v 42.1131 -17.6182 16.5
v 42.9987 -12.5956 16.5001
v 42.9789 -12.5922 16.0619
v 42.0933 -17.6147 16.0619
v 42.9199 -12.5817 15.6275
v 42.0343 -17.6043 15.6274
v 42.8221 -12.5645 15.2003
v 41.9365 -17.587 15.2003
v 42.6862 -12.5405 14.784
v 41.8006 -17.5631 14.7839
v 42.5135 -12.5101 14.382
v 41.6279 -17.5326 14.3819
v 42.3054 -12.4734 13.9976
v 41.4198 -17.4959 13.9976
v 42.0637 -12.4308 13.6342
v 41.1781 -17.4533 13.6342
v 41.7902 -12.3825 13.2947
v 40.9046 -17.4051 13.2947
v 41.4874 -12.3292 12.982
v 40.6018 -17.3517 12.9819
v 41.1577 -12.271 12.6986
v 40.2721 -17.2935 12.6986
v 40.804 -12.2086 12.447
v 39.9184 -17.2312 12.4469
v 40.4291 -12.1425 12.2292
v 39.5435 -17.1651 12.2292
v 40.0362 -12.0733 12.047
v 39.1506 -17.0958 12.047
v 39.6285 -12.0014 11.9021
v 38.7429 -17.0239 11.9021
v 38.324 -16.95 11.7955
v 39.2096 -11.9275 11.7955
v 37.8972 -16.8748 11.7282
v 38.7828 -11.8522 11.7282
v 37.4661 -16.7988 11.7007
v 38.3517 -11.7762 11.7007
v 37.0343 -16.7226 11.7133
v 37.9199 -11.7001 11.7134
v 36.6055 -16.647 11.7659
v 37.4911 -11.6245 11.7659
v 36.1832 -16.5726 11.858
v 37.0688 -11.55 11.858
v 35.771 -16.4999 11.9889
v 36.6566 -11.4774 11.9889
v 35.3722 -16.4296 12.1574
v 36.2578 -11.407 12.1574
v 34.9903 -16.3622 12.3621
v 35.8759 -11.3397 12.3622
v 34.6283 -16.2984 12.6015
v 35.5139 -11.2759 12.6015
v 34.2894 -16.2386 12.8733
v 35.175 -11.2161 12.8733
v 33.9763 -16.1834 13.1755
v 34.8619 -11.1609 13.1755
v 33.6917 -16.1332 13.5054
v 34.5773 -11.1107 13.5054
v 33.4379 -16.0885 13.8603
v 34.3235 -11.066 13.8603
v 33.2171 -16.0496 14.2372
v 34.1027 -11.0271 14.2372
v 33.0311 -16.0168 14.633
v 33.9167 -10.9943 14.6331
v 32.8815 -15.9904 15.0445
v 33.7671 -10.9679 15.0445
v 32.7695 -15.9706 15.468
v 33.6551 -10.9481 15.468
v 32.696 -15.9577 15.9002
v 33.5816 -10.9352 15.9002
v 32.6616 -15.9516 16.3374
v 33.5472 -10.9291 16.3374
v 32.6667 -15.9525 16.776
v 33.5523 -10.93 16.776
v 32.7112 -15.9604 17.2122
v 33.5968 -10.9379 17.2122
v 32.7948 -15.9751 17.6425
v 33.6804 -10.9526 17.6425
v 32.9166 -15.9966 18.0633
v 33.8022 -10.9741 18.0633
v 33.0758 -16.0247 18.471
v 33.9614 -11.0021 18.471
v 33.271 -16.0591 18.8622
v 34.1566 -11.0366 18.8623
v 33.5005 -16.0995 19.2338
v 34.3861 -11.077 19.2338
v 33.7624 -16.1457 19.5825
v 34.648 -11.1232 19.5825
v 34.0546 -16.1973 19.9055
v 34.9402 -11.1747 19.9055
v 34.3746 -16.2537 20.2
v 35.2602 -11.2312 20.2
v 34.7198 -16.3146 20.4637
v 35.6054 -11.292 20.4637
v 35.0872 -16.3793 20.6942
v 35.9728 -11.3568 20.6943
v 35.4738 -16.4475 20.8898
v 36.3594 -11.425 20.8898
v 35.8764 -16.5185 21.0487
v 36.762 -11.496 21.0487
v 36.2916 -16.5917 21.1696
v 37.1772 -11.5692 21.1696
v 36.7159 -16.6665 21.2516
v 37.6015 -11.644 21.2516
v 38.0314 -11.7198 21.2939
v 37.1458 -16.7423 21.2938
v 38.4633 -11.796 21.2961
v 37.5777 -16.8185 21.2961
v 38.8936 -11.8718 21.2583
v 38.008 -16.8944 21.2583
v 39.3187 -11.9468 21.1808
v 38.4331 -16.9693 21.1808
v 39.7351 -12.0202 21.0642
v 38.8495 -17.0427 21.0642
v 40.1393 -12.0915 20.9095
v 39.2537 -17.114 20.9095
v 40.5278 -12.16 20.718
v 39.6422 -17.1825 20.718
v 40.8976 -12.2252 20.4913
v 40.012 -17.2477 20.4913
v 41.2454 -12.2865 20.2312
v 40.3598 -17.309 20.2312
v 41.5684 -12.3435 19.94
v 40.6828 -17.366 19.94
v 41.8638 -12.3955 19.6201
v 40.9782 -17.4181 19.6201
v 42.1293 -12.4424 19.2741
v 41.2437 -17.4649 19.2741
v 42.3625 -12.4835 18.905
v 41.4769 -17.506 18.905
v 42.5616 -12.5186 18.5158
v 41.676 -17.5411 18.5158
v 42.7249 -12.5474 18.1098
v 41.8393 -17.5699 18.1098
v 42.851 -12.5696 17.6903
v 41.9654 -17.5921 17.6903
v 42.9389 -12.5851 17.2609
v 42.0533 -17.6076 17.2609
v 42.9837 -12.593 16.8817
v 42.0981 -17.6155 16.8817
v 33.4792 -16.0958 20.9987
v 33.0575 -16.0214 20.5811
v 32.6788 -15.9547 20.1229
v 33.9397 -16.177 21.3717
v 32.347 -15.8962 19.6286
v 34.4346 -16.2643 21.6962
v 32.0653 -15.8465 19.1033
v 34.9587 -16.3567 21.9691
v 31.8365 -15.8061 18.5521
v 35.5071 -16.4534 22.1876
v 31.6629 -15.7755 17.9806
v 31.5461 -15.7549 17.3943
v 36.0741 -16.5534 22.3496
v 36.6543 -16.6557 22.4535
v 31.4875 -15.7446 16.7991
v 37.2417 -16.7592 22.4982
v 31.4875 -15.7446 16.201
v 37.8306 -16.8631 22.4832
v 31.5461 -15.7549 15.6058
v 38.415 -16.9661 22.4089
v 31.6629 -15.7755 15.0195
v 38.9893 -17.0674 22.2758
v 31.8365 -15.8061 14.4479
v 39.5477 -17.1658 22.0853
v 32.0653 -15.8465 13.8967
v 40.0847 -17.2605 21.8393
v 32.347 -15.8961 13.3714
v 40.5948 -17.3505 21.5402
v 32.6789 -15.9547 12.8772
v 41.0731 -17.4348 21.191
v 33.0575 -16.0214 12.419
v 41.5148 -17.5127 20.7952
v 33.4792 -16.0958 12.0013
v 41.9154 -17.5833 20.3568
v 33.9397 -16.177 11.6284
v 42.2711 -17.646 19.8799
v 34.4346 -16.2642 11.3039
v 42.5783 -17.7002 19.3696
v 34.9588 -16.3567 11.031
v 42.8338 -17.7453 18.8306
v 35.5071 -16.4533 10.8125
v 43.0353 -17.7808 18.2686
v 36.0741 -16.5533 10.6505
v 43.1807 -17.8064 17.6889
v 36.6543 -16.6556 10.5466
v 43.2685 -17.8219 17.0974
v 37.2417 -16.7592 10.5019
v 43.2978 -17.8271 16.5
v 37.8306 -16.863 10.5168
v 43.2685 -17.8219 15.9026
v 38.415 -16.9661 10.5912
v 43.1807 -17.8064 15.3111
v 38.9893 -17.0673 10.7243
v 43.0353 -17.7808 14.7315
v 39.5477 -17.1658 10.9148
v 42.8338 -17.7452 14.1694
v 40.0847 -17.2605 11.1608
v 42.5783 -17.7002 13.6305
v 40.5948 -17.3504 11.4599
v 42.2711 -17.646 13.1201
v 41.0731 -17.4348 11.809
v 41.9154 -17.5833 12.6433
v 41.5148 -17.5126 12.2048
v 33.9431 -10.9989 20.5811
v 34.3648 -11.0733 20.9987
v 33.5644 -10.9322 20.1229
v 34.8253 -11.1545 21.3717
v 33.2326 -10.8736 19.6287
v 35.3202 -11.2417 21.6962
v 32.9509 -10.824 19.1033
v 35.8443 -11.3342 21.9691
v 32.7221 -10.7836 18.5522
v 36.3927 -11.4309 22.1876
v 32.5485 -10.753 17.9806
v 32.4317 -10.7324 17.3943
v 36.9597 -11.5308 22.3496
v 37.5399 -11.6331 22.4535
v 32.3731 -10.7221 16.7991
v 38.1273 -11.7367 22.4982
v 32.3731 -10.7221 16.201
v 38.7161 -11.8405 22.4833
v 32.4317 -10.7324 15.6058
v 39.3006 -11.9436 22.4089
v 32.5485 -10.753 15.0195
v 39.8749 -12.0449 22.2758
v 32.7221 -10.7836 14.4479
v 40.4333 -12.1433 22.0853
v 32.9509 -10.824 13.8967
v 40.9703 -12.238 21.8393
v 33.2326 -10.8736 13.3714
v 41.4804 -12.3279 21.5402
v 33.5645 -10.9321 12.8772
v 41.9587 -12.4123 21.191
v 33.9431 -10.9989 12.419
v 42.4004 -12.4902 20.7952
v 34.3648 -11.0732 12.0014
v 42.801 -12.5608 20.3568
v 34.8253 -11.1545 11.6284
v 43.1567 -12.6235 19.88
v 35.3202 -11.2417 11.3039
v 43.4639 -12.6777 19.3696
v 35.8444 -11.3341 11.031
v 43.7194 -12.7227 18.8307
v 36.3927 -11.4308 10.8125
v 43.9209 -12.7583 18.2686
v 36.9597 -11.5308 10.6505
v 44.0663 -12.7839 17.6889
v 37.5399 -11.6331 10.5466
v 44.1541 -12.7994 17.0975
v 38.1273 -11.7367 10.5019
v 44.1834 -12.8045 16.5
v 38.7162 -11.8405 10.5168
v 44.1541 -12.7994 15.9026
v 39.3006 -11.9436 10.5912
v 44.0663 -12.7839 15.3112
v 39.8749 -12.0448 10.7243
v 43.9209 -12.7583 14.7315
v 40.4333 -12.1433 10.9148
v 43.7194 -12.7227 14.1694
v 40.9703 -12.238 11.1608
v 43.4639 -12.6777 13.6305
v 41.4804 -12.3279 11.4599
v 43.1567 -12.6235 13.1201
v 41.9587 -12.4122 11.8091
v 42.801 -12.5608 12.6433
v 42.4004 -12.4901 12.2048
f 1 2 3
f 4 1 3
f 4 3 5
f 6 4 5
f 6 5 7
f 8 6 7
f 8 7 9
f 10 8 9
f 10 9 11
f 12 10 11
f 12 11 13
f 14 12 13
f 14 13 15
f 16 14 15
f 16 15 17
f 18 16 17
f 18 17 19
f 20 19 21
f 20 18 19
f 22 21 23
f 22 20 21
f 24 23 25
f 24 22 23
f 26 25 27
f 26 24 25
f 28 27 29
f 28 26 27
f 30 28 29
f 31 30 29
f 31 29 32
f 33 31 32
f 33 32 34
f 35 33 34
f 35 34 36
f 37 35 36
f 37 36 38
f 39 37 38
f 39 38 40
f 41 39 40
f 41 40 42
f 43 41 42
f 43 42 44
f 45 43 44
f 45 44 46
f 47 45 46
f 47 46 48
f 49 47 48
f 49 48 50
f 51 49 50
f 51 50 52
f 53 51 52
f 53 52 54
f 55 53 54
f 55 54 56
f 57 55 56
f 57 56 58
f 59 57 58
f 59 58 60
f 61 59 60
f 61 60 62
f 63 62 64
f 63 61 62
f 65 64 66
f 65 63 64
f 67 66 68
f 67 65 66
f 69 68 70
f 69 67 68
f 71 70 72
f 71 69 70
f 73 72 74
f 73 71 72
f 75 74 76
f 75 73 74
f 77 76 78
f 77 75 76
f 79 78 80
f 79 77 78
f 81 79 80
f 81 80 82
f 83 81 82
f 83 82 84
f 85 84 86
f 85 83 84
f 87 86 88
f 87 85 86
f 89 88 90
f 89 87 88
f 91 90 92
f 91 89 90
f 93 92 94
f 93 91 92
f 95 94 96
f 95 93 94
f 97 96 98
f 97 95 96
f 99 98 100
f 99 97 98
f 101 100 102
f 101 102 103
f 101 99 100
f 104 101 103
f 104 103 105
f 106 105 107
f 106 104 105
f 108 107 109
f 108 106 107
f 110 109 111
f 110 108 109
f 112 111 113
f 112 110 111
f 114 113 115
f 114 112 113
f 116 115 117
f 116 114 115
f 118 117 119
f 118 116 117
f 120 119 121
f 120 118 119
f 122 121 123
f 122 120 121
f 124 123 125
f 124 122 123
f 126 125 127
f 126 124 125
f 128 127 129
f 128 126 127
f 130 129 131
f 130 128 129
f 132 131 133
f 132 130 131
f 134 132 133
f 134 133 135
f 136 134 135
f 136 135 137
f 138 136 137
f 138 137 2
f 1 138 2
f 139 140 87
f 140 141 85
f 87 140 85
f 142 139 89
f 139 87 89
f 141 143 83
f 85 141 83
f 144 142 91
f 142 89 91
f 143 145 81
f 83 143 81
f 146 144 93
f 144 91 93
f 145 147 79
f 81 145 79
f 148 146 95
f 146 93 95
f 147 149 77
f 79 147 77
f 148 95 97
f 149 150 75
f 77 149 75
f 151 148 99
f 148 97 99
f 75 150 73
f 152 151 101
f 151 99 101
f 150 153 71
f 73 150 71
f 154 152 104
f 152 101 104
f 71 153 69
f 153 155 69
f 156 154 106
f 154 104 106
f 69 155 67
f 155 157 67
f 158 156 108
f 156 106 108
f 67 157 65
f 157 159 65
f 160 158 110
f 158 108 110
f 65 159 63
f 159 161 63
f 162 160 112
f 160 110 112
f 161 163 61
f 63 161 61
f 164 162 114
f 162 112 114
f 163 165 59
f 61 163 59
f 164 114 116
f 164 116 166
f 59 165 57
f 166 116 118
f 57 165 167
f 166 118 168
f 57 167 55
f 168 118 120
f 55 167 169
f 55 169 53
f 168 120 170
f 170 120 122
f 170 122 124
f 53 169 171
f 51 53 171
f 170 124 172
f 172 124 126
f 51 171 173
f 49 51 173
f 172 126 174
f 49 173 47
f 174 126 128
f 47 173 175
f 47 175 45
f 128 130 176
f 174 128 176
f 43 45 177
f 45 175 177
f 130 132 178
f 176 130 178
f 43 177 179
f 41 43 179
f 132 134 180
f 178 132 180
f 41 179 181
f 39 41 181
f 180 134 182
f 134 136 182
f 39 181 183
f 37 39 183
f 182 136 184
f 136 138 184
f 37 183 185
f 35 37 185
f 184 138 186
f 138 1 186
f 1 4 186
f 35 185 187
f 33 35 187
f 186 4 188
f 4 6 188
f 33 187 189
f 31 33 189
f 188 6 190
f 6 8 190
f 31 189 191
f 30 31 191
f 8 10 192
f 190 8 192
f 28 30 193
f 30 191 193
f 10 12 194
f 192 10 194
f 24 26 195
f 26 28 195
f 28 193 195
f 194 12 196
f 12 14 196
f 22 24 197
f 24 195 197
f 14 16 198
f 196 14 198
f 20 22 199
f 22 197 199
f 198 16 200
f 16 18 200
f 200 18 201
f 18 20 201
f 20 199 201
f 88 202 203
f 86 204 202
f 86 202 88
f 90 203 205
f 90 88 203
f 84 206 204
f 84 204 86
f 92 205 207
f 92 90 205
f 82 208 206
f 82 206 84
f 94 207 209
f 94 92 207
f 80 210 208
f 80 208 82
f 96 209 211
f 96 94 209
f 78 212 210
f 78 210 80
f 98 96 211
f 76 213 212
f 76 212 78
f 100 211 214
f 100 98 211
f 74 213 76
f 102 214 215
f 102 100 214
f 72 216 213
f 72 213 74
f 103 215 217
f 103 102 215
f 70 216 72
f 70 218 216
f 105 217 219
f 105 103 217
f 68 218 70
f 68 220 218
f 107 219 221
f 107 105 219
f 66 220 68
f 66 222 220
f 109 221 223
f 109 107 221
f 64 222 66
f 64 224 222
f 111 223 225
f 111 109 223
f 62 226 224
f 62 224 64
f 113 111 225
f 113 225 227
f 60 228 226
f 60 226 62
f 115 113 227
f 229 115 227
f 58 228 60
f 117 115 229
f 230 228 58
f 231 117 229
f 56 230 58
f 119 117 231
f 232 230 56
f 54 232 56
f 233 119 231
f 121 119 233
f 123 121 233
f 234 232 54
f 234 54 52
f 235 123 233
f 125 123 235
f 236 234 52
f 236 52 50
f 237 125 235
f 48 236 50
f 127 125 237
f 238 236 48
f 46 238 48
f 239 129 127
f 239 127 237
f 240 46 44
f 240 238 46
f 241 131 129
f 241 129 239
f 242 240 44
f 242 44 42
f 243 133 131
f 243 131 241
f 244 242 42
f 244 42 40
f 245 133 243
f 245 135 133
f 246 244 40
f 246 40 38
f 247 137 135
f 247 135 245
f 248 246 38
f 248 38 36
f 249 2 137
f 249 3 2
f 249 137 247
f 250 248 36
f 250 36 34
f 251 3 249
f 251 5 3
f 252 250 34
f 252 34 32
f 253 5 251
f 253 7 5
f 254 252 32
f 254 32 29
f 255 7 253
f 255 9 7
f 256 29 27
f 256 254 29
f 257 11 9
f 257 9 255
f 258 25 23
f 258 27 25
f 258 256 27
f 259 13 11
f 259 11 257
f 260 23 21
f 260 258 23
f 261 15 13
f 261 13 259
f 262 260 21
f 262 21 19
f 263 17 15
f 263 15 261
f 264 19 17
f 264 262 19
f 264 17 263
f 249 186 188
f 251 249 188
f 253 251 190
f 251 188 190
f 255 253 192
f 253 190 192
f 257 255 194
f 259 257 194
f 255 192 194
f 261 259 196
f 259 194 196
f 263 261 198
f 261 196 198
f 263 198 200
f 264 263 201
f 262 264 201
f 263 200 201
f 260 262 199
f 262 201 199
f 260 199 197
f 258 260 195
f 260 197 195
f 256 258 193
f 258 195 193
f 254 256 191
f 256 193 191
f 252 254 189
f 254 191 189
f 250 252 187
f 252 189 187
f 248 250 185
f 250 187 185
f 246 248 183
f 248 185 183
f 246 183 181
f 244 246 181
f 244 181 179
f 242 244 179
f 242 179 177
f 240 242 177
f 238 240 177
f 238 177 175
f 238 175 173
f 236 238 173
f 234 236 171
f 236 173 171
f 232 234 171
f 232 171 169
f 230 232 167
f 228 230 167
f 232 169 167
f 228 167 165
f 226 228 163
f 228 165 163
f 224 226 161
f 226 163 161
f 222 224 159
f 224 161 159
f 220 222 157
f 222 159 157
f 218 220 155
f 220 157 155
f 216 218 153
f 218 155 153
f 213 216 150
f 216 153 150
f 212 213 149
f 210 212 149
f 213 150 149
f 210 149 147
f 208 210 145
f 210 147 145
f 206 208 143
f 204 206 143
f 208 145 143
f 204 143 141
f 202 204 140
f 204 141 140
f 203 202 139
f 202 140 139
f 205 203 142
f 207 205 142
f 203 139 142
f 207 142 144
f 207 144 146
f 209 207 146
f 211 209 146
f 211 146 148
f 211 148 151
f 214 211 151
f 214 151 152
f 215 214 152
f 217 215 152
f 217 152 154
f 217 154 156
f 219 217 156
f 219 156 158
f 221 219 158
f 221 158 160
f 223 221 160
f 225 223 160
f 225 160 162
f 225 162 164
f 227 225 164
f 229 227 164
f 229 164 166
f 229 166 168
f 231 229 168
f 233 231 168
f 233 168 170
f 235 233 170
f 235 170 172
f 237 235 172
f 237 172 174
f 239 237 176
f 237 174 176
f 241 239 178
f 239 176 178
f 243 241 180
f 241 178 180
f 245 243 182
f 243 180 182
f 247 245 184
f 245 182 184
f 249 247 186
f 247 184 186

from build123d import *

# Parameters (mm, degrees)
CYLINDER063_R               = 4.8
CYLINDER063_DEPTH           = 18
CYLINDER063_ROLL_ANGLE      = -89.999776
CYLINDER063_PITCH_ANGLE     = 1.4e-05
CYLINDER063_PLACEMENT_ANGLE = -9.999925
CYLINDER062_R               = 6
CYLINDER062_DEPTH           = 5.1
CYLINDER062_ROLL_ANGLE      = -89.999807
CYLINDER062_PITCH_ANGLE     = 8e-06
CYLINDER062_PLACEMENT_ANGLE = -9.999933


with BuildPart() as cylinder063:
    # Cylinder063 → Cylinder063 (new body)
    with BuildSketch(Plane.XY):
        Circle(CYLINDER063_R)
    extrude(amount=CYLINDER063_DEPTH)


with BuildPart() as cylinder063_1:
    # Cylinder063 roll: moved
    add(cylinder063.part.rotate(Axis((0, 0, 0), (1, 0, 0)), CYLINDER063_ROLL_ANGLE))


with BuildPart() as cylinder063_2:
    # Cylinder063 pitch: moved
    add(cylinder063_1.part.rotate(Axis((0, 0, 0), (0, 1, 0)), CYLINDER063_PITCH_ANGLE))


with BuildPart() as cylinder063_3:
    # Cylinder063 placement: moved
    add(cylinder063_2.part.moved(Location((35.146424, -29.285947, 16.499989))).rotate(Axis((35.146424, -29.285947, 16.499989), (0, 0, 1)), CYLINDER063_PLACEMENT_ANGLE))


with BuildPart() as cut060:
    # Cylinder062 → Cylinder062 (new body)
    with BuildSketch(Plane.XY):
        Circle(CYLINDER062_R)
    extrude(amount=CYLINDER062_DEPTH)


with BuildPart() as cut060_1:
    # Cylinder062 roll: moved
    add(cut060.part.rotate(Axis((0, 0, 0), (1, 0, 0)), CYLINDER062_ROLL_ANGLE))


with BuildPart() as cut060_2:
    # Cylinder062 pitch: moved
    add(cut060_1.part.rotate(Axis((0, 0, 0), (0, 1, 0)), CYLINDER062_PITCH_ANGLE))


with BuildPart() as cut060_3:
    # Cylinder062 placement: moved
    add(cut060_2.part.moved(Location((37.388984, -16.585183, 16.500027))).rotate(Axis((37.388984, -16.585183, 16.500027), (0, 0, 1)), CYLINDER062_PLACEMENT_ANGLE))

    # Cut060: cut Cylinder063
    add(cylinder063_3.part, mode=Mode.SUBTRACT)


with BuildPart() as cut060_4:
    # Cut060 placement: moved
    add(cut060_3.part.moved(Location((0, -0.2, 0))))


solid = cut060_4.part
